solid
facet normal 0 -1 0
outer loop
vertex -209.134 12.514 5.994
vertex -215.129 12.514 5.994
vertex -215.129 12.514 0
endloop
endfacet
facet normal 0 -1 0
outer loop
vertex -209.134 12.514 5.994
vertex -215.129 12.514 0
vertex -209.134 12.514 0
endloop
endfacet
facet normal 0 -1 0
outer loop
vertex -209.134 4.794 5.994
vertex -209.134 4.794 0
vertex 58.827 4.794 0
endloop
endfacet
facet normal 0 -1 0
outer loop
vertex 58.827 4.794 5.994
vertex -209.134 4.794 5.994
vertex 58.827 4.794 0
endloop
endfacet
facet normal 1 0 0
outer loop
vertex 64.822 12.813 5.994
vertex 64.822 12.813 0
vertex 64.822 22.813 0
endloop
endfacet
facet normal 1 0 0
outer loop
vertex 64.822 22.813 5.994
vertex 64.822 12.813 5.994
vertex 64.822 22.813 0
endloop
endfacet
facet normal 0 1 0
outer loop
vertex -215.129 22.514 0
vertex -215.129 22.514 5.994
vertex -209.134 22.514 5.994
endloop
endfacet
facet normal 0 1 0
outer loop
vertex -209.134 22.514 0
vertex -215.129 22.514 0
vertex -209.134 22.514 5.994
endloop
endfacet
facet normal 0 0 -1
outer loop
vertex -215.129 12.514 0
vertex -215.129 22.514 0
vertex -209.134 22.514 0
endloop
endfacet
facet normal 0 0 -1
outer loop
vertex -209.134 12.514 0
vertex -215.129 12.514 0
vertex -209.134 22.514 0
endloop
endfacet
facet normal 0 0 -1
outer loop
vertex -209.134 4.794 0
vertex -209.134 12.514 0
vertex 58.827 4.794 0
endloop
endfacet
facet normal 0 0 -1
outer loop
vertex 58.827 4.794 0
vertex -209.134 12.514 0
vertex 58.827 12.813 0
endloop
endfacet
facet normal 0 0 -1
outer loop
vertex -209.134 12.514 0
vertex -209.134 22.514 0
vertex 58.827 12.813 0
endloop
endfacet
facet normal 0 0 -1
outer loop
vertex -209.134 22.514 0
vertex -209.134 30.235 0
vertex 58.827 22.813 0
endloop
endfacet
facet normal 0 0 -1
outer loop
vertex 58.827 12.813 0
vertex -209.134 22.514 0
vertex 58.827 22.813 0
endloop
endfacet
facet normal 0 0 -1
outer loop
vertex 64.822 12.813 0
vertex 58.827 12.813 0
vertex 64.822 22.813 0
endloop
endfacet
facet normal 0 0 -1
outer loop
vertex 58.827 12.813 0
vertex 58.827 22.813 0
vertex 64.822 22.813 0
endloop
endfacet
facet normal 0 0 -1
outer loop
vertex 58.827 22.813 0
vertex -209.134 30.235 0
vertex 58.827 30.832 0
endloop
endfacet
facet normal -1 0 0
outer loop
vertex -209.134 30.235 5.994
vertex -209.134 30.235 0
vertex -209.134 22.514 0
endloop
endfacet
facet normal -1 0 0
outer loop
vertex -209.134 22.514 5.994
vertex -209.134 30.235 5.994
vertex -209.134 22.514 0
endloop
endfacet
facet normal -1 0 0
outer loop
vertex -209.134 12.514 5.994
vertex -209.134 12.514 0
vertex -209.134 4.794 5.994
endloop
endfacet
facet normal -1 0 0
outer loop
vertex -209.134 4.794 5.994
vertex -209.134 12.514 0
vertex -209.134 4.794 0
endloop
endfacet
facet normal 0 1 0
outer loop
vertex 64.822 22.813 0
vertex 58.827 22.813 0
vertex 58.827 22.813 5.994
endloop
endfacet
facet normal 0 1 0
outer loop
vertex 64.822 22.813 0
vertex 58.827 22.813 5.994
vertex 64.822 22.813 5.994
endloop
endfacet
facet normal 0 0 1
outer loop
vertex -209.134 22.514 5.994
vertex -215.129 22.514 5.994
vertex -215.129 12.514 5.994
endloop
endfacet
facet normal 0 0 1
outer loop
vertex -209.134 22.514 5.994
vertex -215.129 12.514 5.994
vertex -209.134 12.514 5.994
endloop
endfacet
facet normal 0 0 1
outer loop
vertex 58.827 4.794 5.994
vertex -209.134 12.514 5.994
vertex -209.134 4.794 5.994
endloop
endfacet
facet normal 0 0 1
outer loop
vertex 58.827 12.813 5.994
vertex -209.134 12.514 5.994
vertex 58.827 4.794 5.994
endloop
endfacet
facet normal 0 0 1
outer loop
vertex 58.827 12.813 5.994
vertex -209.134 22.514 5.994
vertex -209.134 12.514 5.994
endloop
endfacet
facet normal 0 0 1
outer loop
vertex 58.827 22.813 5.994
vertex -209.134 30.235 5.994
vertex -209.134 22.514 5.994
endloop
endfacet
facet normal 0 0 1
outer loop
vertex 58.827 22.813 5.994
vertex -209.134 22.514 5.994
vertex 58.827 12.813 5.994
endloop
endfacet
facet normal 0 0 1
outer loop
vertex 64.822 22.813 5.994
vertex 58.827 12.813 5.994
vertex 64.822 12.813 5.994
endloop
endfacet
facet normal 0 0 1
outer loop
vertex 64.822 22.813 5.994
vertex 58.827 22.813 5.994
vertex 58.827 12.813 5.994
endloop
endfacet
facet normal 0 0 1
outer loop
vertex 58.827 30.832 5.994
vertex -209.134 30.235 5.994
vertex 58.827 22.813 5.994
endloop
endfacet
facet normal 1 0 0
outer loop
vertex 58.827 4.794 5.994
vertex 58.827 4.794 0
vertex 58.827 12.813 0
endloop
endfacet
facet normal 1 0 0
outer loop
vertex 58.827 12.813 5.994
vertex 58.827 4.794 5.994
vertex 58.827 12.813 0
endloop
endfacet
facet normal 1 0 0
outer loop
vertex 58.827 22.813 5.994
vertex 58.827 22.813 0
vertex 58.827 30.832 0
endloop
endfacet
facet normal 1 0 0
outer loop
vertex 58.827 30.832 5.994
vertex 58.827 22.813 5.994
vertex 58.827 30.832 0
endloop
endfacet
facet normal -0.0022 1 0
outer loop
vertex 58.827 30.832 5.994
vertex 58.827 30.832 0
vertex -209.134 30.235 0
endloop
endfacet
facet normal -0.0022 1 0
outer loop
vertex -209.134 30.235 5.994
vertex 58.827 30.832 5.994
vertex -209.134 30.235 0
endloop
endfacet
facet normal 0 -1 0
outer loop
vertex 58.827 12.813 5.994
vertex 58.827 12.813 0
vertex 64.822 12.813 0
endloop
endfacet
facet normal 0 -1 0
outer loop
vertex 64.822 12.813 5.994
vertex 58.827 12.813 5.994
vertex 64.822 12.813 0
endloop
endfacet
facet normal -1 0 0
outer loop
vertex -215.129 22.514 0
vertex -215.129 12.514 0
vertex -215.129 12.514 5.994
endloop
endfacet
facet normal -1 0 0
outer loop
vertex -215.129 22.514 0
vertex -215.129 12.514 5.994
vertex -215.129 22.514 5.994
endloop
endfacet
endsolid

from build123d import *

# Parameters (mm, degrees)
SKETCH1_W      = 5.9944
SKETCH1_H      = 10
EXTRUDE1_DEPTH = 5.9944


with BuildPart() as part:
    # Sketch1 → Extrude1 (new body)
    with BuildSketch(Plane.XY):
        Polygon((-209.134206709, 4.793644232), (58.827458806, 4.793644232), (58.827458806, 30.831866903), (-209.134206709, 30.234993462), align=None)
        with Locations((-212.131406709, 17.514318847)):
            Rectangle(SKETCH1_W, SKETCH1_H)
        with Locations((61.824658806, 17.812755567)):
            Rectangle(SKETCH1_W, SKETCH1_H)
    extrude(amount=EXTRUDE1_DEPTH)


solid = part.part
